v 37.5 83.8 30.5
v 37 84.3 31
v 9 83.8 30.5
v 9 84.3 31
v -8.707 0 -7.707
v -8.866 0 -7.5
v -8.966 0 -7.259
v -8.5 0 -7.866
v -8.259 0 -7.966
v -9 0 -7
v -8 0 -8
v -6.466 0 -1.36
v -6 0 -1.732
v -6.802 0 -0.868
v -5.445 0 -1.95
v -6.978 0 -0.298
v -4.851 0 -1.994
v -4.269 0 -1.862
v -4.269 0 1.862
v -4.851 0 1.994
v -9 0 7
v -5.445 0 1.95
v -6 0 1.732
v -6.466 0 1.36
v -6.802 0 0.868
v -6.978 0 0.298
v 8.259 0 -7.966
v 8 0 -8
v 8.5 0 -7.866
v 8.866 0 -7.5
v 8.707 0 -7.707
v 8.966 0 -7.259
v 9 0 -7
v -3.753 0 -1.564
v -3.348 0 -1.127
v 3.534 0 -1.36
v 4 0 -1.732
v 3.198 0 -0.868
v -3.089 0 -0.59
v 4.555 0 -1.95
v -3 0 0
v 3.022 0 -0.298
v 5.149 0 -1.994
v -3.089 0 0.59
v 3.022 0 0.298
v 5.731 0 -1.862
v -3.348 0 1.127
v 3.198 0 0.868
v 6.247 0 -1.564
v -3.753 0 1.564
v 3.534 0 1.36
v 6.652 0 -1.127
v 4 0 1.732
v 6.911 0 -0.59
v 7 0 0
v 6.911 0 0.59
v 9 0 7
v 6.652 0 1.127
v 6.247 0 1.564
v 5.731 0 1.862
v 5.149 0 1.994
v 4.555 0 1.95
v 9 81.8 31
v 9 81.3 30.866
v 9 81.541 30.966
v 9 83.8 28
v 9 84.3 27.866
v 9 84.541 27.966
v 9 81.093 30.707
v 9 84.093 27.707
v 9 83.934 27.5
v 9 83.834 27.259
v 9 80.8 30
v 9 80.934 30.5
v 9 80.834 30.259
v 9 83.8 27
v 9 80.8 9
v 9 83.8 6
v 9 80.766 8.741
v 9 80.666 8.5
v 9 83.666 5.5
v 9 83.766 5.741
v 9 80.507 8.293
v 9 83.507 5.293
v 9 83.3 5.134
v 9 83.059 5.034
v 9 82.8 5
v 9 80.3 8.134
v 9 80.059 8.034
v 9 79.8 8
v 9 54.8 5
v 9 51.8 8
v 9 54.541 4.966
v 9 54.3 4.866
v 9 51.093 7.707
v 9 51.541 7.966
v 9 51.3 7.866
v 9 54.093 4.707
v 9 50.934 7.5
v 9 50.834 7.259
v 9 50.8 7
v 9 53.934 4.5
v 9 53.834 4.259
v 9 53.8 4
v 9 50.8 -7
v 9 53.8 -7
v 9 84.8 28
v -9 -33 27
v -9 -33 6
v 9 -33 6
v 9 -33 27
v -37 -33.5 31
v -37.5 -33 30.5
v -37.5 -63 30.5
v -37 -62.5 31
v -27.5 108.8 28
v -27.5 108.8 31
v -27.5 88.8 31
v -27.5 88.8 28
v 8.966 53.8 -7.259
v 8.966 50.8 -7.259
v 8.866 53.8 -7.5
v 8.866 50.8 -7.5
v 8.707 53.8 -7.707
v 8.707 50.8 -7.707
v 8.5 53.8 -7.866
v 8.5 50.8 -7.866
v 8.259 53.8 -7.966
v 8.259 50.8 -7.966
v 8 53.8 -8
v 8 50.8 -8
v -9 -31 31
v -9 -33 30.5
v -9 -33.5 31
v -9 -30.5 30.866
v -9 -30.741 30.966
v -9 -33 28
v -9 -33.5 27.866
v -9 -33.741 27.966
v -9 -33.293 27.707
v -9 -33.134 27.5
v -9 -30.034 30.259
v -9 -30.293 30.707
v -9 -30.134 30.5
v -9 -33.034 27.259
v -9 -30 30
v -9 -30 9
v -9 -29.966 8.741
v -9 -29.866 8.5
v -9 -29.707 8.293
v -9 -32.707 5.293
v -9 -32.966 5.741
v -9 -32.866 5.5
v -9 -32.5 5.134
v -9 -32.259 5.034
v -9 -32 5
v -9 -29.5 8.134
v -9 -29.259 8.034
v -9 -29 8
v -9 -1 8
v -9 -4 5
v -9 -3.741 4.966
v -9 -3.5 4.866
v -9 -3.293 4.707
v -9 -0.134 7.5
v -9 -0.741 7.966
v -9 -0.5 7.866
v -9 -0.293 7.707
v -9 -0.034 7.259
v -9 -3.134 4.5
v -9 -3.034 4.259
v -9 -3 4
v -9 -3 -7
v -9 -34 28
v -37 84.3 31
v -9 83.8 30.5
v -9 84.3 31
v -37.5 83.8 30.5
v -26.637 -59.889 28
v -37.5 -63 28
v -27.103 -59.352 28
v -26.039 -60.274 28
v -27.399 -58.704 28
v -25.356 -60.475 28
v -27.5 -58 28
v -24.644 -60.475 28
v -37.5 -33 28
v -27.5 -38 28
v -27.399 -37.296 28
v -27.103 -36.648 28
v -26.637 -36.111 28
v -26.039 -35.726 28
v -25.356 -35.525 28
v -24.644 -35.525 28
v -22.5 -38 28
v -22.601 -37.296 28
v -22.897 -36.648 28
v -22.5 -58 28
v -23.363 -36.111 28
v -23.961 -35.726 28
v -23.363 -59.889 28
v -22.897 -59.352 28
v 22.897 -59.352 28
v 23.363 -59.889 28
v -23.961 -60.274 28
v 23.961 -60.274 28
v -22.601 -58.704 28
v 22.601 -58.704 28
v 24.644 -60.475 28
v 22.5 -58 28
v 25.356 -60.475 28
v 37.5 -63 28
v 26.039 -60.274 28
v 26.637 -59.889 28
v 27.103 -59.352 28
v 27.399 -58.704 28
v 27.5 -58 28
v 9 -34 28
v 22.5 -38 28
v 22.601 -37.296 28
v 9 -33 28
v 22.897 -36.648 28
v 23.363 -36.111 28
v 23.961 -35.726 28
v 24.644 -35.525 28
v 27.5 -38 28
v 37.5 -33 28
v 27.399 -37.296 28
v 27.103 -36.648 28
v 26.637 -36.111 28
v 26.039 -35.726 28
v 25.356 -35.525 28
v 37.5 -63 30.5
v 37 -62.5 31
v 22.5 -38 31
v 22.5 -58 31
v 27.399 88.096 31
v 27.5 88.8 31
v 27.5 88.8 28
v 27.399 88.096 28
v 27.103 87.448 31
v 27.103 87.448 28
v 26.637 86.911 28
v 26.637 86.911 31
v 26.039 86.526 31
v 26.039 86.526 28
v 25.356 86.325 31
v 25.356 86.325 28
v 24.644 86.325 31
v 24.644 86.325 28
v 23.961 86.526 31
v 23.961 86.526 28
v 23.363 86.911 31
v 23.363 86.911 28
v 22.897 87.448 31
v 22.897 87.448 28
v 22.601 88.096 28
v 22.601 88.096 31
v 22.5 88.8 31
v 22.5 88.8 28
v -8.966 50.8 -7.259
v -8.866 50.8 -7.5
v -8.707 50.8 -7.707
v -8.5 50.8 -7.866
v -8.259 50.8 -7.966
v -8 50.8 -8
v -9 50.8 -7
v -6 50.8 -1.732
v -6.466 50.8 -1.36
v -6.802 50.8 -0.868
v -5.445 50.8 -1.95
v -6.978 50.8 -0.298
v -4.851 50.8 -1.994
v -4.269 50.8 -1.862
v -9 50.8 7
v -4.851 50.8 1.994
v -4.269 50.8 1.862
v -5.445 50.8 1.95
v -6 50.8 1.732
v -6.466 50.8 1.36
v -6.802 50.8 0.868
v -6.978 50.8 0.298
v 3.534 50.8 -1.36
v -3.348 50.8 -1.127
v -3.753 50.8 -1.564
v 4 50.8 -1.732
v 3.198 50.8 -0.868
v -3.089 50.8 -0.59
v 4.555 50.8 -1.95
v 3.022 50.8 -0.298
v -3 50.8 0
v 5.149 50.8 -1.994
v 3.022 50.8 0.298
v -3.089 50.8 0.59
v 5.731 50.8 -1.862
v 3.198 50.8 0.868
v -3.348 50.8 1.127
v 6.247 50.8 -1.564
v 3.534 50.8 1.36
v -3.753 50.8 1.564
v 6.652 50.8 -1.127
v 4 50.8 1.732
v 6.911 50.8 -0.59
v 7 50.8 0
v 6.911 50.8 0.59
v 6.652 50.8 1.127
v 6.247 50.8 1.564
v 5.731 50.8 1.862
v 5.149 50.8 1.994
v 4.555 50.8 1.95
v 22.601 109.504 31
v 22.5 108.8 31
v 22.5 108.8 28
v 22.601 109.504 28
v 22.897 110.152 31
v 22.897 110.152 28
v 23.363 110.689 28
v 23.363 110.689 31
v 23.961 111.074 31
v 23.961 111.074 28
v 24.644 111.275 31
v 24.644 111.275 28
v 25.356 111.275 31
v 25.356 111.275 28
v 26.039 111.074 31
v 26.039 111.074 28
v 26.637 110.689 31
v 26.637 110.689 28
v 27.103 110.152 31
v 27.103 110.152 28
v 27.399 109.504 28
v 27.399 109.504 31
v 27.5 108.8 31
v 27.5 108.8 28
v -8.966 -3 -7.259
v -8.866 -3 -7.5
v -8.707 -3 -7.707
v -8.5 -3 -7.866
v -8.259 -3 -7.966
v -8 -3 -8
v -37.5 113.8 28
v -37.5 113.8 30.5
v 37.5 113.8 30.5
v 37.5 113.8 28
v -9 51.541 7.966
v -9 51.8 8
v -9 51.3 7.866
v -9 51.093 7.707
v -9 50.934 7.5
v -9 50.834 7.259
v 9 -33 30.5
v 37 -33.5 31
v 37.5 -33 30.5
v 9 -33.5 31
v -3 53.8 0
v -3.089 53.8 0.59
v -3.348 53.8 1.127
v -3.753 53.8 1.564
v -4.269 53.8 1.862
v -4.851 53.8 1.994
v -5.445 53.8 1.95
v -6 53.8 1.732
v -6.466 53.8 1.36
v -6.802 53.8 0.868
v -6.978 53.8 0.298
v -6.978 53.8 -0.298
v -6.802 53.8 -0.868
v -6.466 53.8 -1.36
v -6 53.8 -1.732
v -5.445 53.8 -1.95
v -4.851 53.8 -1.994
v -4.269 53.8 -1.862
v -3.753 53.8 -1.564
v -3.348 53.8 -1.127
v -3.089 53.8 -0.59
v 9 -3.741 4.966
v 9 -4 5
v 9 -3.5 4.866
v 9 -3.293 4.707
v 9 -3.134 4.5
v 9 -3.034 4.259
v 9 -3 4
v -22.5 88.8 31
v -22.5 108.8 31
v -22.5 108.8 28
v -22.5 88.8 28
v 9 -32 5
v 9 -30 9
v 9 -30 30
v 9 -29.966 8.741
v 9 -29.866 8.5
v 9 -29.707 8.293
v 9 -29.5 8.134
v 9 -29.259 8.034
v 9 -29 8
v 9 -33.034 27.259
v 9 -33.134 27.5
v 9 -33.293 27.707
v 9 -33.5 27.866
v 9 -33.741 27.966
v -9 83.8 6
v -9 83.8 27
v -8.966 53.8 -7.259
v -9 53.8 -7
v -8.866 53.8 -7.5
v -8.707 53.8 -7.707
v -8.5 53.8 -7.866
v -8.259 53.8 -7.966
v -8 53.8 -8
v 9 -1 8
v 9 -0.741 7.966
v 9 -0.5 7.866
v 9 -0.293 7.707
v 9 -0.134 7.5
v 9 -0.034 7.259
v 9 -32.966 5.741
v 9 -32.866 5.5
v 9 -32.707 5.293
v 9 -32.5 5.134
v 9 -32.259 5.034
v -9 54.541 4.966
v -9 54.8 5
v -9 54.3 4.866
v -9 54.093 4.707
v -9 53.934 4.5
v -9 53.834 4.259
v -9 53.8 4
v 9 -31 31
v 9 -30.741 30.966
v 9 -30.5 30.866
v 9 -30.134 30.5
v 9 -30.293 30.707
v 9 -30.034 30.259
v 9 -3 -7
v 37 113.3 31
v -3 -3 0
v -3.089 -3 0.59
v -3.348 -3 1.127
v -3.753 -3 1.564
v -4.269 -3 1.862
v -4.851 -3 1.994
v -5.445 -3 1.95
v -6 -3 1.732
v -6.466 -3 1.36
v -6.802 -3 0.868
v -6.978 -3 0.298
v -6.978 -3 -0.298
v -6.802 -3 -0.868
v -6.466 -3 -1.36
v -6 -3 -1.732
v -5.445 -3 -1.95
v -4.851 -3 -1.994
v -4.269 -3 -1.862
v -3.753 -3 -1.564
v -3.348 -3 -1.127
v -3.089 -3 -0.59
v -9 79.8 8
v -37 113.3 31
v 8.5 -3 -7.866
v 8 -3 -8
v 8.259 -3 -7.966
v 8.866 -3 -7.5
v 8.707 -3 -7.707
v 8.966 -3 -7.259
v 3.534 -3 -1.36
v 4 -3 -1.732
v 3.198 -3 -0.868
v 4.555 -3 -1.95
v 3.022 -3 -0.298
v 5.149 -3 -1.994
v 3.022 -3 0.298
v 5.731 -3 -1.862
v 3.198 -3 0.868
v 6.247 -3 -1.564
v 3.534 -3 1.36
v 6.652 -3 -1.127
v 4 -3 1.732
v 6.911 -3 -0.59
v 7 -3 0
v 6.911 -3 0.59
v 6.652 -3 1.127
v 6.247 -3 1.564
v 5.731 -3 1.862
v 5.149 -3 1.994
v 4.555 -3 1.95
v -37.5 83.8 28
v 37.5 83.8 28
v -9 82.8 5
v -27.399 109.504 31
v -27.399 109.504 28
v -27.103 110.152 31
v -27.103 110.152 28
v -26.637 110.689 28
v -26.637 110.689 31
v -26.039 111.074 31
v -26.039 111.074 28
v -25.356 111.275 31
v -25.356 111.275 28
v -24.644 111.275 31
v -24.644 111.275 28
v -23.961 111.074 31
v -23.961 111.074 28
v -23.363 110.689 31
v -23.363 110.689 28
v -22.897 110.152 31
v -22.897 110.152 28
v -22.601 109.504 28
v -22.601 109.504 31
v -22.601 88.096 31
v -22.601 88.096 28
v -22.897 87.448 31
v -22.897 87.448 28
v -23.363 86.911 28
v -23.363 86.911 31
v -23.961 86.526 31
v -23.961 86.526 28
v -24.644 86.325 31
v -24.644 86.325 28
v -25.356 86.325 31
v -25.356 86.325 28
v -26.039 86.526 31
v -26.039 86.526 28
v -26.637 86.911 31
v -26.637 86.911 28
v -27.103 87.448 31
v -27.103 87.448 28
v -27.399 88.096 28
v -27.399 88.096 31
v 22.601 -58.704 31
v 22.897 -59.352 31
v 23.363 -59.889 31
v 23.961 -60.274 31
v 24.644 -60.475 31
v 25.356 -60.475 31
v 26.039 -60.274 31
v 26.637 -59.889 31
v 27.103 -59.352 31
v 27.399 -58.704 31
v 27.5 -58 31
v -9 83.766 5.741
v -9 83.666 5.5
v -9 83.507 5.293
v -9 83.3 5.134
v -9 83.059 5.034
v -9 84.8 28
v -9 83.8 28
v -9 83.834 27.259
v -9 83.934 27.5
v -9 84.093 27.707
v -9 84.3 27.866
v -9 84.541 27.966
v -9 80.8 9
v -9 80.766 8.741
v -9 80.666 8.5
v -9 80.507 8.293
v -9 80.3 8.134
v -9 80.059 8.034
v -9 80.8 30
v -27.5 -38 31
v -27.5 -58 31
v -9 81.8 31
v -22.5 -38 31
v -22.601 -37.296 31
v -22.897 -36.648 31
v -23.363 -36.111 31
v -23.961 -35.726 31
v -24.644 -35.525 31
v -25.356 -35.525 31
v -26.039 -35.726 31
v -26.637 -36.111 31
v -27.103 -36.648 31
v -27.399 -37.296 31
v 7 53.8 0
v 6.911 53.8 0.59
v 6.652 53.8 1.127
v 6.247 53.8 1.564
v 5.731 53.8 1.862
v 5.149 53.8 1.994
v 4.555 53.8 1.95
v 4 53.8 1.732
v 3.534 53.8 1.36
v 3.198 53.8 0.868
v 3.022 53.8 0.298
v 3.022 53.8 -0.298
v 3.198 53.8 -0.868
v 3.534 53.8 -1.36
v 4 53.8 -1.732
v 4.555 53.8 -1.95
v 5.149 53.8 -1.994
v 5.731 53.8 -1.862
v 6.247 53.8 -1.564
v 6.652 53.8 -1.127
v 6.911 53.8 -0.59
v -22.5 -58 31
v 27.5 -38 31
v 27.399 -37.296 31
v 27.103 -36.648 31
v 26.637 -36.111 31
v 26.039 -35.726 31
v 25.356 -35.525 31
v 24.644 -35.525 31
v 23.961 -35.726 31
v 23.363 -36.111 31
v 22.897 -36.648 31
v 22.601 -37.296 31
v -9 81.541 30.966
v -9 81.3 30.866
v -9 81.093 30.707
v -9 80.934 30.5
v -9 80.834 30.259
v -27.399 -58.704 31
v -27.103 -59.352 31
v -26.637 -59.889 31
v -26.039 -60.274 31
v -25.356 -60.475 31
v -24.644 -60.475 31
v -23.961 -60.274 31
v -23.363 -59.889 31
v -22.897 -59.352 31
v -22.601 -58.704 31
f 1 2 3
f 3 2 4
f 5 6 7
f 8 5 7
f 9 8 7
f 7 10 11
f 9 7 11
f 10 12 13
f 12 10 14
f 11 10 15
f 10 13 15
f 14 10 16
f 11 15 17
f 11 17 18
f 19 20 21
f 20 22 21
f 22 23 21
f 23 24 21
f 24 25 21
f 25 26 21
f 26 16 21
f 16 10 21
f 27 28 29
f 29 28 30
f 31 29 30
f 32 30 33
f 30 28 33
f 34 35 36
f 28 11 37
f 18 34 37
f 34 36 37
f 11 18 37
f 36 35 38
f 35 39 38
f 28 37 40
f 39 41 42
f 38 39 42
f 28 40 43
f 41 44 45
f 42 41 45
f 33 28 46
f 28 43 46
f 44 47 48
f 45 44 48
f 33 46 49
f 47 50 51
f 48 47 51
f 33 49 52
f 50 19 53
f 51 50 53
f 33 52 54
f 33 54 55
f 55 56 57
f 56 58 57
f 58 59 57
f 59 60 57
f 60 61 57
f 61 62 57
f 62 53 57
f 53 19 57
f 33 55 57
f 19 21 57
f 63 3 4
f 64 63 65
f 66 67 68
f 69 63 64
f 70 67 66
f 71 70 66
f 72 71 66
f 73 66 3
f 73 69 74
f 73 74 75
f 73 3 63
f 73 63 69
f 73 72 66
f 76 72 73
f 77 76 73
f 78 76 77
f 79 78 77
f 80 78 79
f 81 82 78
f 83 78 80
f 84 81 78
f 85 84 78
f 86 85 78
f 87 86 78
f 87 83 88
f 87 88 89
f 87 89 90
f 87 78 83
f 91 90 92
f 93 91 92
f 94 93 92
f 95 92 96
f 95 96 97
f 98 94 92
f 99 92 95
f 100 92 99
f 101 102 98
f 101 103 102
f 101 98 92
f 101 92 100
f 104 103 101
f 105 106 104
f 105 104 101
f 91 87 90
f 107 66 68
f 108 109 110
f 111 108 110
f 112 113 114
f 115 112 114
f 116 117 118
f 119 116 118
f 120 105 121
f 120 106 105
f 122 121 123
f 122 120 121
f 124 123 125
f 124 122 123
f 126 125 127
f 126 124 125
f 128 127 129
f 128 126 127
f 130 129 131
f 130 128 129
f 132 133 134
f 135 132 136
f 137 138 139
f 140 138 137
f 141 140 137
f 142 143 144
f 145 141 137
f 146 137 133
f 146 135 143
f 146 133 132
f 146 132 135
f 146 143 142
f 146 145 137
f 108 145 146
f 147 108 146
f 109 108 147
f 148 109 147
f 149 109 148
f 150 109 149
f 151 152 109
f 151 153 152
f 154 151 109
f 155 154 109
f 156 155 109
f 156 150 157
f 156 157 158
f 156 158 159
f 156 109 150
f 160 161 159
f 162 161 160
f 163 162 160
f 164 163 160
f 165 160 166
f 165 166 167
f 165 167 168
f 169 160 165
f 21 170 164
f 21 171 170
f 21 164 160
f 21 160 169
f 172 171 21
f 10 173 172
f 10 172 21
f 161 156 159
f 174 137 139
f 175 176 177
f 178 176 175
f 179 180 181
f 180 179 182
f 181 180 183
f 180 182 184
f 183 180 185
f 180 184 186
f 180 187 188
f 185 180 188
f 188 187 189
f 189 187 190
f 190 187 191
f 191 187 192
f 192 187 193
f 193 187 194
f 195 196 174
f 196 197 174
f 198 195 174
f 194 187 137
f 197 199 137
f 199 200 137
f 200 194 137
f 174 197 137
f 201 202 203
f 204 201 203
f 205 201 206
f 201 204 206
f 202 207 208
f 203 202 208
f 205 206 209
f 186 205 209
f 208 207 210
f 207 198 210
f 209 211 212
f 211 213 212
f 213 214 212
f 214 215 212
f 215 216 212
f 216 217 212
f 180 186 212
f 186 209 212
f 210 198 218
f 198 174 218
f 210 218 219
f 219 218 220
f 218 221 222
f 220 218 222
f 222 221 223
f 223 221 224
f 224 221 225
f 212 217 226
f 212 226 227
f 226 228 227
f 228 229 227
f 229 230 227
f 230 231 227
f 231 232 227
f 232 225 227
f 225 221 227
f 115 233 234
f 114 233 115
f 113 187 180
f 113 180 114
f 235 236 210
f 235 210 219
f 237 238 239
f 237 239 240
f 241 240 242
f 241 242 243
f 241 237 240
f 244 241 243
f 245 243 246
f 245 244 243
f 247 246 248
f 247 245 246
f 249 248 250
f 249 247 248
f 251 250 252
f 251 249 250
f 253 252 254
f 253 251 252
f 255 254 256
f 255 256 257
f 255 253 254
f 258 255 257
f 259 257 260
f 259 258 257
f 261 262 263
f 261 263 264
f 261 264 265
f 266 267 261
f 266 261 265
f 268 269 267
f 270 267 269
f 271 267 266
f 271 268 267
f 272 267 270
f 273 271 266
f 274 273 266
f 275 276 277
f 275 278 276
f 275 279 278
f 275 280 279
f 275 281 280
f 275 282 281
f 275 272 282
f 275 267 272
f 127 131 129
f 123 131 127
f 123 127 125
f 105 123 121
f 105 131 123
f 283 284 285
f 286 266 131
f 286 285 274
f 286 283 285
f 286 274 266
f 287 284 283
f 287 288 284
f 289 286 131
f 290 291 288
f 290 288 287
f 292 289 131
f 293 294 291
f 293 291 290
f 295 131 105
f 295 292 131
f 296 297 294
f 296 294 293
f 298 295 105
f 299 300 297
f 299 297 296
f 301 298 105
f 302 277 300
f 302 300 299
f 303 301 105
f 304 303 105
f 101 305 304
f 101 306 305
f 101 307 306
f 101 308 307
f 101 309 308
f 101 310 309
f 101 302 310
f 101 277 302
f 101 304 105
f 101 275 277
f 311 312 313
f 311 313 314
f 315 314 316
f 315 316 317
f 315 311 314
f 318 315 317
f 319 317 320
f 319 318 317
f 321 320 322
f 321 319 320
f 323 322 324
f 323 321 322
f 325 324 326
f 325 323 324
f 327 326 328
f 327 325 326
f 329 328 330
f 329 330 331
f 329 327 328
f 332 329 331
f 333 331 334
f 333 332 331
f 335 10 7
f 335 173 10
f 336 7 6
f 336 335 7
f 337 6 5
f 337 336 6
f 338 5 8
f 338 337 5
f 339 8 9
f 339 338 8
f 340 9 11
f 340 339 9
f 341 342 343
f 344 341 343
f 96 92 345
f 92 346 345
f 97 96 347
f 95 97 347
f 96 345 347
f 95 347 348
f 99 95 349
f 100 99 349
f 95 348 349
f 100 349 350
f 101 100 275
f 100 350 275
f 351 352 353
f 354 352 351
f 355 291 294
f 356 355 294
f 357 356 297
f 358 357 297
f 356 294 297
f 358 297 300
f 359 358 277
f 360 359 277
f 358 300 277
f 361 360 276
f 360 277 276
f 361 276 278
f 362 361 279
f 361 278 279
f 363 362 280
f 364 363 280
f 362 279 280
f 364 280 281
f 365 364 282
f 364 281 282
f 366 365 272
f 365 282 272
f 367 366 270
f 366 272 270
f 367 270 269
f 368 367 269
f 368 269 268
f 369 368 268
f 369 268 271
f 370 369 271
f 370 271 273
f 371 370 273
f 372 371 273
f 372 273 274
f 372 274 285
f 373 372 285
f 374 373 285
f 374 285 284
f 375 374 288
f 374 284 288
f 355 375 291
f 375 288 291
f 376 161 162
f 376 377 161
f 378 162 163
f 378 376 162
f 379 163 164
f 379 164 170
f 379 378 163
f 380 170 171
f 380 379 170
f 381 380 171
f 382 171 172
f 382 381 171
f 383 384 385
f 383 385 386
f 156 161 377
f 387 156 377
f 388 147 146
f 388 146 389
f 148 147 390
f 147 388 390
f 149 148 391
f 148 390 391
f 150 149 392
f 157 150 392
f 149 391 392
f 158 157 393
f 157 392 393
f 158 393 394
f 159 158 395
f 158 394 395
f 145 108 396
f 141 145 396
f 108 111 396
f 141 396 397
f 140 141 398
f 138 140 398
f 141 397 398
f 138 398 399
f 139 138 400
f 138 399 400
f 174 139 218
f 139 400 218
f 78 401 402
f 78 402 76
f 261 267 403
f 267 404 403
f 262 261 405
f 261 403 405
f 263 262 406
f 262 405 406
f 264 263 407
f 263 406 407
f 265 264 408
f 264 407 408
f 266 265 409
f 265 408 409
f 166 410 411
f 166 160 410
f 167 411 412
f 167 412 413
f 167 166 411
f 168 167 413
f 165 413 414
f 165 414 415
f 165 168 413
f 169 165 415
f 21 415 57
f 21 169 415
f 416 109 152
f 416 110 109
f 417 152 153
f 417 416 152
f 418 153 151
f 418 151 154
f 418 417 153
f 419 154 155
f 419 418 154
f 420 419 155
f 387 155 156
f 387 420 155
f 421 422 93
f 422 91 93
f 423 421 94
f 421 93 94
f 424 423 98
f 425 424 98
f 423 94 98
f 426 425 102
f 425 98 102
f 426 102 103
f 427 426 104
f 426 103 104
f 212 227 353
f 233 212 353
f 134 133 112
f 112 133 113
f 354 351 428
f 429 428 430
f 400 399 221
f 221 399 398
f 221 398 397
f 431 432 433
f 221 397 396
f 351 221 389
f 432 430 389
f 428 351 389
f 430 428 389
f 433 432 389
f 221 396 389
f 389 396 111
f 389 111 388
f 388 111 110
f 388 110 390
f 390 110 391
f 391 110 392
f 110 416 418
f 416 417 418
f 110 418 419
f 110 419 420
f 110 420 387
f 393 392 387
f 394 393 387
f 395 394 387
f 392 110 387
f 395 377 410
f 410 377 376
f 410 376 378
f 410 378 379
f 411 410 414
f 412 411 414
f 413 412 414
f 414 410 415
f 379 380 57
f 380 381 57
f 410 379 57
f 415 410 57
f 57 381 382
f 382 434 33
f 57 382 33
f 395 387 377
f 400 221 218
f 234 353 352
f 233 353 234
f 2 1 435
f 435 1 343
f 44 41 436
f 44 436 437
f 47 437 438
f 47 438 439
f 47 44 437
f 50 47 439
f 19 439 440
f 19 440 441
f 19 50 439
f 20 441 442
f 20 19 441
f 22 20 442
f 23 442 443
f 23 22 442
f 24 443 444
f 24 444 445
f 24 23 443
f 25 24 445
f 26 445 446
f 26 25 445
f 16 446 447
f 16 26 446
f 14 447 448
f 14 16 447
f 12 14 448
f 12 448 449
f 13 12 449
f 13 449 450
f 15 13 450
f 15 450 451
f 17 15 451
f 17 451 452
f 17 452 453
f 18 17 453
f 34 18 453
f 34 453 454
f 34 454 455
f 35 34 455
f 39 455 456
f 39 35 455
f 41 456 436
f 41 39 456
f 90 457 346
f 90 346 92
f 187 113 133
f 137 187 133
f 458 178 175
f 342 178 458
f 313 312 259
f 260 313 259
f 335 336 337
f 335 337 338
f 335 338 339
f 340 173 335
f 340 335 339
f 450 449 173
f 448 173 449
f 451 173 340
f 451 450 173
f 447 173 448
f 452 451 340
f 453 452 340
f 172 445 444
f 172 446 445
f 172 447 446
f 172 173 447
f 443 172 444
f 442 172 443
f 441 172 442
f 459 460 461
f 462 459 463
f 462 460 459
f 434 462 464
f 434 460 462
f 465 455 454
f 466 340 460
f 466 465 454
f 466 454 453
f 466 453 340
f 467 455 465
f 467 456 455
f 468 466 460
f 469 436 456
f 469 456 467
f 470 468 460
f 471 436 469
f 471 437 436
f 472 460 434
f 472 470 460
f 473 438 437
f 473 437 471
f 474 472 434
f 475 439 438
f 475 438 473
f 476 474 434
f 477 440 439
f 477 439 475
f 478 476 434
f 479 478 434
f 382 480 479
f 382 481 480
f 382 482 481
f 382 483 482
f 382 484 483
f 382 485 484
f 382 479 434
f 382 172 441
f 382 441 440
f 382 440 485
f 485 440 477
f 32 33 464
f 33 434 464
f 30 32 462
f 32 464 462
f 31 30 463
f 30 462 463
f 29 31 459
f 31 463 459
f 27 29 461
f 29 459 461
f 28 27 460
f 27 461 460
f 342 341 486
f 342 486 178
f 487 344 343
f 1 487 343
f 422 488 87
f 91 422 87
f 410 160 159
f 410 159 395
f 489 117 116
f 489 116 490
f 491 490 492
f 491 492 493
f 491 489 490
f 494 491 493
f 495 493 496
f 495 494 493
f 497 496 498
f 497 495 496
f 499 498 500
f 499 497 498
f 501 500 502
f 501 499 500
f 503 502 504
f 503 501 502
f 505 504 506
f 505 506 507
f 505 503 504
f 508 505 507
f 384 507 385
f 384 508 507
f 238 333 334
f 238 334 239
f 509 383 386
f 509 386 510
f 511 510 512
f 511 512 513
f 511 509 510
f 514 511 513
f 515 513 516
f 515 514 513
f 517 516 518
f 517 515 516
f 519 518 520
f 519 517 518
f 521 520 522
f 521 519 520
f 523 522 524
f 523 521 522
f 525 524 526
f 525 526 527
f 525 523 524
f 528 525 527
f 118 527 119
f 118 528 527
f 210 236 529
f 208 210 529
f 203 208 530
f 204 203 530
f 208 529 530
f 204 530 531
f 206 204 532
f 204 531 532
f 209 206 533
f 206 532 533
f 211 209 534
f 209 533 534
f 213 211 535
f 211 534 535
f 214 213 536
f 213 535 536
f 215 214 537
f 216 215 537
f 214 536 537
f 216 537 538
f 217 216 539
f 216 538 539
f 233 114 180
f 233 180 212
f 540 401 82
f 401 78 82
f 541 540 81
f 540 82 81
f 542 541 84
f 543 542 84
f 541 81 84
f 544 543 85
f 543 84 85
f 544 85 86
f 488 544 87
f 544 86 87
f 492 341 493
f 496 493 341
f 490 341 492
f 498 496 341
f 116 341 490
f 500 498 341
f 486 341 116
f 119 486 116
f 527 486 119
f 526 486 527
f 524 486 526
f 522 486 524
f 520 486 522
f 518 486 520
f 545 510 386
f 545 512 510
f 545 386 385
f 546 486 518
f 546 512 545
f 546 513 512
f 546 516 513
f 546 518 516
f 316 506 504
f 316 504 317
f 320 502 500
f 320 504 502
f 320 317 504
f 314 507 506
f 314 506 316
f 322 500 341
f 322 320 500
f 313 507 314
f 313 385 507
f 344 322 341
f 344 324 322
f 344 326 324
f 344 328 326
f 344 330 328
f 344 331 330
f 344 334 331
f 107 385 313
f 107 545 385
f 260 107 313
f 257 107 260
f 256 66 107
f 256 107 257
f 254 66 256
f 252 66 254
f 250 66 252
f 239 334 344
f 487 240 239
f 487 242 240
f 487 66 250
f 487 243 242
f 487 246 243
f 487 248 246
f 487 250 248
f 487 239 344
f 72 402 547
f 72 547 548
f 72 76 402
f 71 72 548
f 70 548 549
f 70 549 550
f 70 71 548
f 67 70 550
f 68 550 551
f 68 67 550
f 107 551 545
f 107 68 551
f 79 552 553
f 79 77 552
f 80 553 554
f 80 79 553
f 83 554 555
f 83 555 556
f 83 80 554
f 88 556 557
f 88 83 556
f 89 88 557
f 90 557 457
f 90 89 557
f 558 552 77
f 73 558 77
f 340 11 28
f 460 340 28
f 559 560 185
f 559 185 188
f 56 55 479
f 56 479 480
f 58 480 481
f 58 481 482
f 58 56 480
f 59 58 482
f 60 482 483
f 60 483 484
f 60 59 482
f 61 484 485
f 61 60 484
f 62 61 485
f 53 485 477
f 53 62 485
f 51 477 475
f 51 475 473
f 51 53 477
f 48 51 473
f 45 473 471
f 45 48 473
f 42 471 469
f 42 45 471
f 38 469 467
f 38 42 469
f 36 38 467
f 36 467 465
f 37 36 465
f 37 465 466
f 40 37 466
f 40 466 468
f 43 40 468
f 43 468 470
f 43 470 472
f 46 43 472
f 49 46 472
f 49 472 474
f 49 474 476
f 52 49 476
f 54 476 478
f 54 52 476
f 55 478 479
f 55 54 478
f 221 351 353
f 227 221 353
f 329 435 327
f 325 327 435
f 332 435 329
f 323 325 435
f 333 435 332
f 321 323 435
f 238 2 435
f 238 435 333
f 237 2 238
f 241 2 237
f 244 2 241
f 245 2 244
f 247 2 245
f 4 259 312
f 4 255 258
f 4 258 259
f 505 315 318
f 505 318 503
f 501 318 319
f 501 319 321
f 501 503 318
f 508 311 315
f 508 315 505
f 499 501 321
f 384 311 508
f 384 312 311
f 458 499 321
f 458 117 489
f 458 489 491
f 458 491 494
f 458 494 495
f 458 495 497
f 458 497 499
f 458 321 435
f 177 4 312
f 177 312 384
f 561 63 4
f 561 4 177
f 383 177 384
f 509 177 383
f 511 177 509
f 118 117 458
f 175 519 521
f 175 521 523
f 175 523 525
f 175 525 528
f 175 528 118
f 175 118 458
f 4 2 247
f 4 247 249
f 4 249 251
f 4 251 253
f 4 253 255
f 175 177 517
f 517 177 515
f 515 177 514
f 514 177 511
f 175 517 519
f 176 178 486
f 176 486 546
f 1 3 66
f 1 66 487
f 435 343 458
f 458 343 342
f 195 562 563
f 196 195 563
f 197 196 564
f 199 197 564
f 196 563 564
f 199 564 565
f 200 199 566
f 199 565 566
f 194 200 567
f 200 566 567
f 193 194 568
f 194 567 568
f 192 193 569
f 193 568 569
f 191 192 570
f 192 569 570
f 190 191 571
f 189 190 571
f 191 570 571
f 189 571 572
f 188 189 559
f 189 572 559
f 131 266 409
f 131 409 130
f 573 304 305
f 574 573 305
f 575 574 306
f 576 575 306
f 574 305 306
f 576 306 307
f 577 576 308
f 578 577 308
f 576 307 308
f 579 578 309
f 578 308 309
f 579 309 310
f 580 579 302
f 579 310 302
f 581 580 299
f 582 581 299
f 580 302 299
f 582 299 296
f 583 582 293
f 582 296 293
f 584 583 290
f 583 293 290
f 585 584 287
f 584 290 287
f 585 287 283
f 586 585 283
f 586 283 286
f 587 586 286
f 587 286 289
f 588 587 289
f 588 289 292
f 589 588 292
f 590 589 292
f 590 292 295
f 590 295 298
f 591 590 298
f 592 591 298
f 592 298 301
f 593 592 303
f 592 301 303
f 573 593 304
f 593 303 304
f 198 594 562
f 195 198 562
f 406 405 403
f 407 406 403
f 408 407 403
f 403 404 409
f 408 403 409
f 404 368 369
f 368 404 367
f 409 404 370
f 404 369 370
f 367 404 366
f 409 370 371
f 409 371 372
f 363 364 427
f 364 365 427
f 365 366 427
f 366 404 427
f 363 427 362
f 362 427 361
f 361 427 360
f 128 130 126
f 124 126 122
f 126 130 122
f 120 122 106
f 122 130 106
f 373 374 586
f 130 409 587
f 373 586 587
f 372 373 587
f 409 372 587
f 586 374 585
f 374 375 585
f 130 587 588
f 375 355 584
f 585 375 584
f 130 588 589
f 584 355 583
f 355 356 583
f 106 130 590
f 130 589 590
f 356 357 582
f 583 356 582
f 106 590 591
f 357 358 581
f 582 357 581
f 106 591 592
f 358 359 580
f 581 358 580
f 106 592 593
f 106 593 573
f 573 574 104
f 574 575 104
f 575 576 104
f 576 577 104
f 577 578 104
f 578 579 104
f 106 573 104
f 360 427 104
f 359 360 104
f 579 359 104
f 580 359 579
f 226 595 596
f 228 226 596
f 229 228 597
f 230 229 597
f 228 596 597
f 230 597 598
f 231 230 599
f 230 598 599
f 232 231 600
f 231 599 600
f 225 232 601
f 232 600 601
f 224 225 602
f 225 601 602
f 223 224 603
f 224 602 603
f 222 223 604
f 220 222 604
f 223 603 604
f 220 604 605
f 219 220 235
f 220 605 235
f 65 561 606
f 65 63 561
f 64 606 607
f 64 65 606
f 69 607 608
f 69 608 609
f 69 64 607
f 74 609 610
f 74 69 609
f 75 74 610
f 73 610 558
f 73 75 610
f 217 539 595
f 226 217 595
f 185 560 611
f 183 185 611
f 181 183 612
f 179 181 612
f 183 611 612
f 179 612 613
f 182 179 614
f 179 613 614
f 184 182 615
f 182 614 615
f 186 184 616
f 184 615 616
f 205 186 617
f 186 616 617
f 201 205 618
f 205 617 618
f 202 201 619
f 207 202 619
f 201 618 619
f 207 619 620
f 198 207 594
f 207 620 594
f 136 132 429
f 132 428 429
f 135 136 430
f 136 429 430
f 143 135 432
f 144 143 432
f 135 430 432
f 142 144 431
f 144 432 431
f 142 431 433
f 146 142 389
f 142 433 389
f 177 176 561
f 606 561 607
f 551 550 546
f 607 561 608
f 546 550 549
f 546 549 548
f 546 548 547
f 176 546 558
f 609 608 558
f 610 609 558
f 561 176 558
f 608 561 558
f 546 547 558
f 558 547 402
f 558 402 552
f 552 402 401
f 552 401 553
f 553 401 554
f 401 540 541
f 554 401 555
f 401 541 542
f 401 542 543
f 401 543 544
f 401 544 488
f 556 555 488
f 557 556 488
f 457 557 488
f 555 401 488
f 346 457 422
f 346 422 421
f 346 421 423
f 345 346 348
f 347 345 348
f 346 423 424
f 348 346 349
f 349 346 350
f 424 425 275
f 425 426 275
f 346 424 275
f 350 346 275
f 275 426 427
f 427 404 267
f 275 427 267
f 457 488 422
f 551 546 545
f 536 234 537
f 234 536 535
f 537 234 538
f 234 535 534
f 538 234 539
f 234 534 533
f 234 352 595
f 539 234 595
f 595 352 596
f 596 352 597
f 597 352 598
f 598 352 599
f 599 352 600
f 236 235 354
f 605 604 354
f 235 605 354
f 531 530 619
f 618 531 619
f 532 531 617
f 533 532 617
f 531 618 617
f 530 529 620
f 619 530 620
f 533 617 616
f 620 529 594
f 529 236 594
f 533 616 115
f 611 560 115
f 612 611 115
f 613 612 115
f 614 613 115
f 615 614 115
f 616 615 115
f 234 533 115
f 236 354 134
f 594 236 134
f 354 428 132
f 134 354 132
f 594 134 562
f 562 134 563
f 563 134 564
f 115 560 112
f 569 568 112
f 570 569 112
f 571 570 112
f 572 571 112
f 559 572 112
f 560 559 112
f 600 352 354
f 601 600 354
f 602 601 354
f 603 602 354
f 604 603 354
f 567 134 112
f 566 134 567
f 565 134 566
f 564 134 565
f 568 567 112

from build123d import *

# Parameters (mm, degrees)
F0_W     = 9
F0_H     = 16
F0_R     = 2
F1_DEPTH = 3
F2_W     = 18
F2_H     = 3
F3_DEPTH = 30
F4_W     = 18
F4_H     = 3
F5_DEPTH = 23
F6_W     = 28.5
F6_H     = 3
F6_W_2   = 18
F7_DEPTH = 30
F8_W     = 5
F8_H     = 20
F9_DEPTH = 39.001
F10_R    = 1
F11_R    = 1
F12_SIZE = 0.5
F13_R    = 1


with BuildPart() as f1:
    # F0 (on Front) → F1 (new body)
    with BuildSketch(Plane.XZ):
        with Locations((4.5, 0)):
            Rectangle(F0_W, F0_H)
        with Locations((5, 0)):
            Circle(F0_R, mode=Mode.SUBTRACT)
        with Locations((-4.5, 0)):
            Rectangle(F0_W, F0_H)
        with Locations((-5, 0)):
            Circle(F0_R, mode=Mode.SUBTRACT)
    extrude(amount=F1_DEPTH)

    # F2 (on face) → F3 (join)
    with BuildSketch(Plane.XZ.offset(3)):
        with Locations((0, 6.5)):
            Rectangle(F2_W, F2_H)
    extrude(amount=F3_DEPTH)

    # F4 (on face) → F5 (join)
    with BuildSketch(Plane.XY.offset(8)):
        with Locations((0, -31.5)):
            Rectangle(F4_W, F4_H)
    extrude(amount=F5_DEPTH)

    # F6 (on face) → F7 (join)
    with BuildSketch(Plane.XZ.offset(33)):
        with Locations((-23.25, 29.5)):
            Rectangle(F6_W, F6_H)
        with Locations((0, 29.5)):
            Rectangle(F6_W_2, F6_H)
        with Locations((23.25, 29.5)):
            Rectangle(F6_W, F6_H)
    extrude(amount=F7_DEPTH)

    # F8 (on face) → F9 (cut, through all)
    with BuildSketch(Plane.XY.offset(31)):
        with BuildLine():
            Line((-27.5, -38), (-22.5, -38))
            ThreePointArc((-22.5, -38), (-25, -35.5), (-27.5, -38))
        make_face()
        with Locations((-25, -48)):
            Rectangle(F8_W, F8_H)
        with BuildLine():
            Line((27.5, -58), (22.5, -58))
            ThreePointArc((22.5, -58), (25, -60.5), (27.5, -58))
        make_face()
        with Locations((25, -48)):
            Rectangle(F8_W, F8_H)
        with BuildLine():
            ThreePointArc((-27.5, -58), (-25, -60.5), (-22.5, -58))
            Line((-22.5, -58), (-27.5, -58))
        make_face()
        with BuildLine():
            ThreePointArc((27.5, -38), (25, -35.5), (22.5, -38))
            Line((22.5, -38), (27.5, -38))
        make_face()
    extrude(amount=-F9_DEPTH, mode=Mode.SUBTRACT)

    # F10
    f10_edges = [f1.edges().sort_by_distance(p)[0] for p in [
        (0, 0, 8),
        (0, -30, 8),
        (0, -30, 31),
    ]]
    fillet(f10_edges, radius=F10_R)

    # F11
    f11_edges = [f1.edges().sort_by_distance(p)[0] for p in [
        (0, -3, 5),
        (0, -33, 5),
        (0, -33, 28),
    ]]
    fillet(f11_edges, radius=F11_R)

    # F12
    f12_edges = [f1.edges().sort_by_distance(p)[0] for p in [
        (23.25, -33, 31),
        (-23.25, -33, 31),
        (37.5, -48, 31),
        (0, -63, 31),
        (-37.5, -48, 31),
    ]]
    chamfer(f12_edges, length=F12_SIZE)

    # F13
    f13_edges = [f1.edges().sort_by_distance(p)[0] for p in [
        (9, -1.5, -8),
        (-9, -1.5, -8),
    ]]
    fillet(f13_edges, radius=F13_R)


with BuildPart() as f15_1:
    # F15: instance of F1
    add(f1.part.mirror(Plane(origin=(0, 25.4, -0.5386323373), x_dir=(1, 0, 0), z_dir=(0, 1, 0))))


solid = Compound([f1.part, f15_1.part])
